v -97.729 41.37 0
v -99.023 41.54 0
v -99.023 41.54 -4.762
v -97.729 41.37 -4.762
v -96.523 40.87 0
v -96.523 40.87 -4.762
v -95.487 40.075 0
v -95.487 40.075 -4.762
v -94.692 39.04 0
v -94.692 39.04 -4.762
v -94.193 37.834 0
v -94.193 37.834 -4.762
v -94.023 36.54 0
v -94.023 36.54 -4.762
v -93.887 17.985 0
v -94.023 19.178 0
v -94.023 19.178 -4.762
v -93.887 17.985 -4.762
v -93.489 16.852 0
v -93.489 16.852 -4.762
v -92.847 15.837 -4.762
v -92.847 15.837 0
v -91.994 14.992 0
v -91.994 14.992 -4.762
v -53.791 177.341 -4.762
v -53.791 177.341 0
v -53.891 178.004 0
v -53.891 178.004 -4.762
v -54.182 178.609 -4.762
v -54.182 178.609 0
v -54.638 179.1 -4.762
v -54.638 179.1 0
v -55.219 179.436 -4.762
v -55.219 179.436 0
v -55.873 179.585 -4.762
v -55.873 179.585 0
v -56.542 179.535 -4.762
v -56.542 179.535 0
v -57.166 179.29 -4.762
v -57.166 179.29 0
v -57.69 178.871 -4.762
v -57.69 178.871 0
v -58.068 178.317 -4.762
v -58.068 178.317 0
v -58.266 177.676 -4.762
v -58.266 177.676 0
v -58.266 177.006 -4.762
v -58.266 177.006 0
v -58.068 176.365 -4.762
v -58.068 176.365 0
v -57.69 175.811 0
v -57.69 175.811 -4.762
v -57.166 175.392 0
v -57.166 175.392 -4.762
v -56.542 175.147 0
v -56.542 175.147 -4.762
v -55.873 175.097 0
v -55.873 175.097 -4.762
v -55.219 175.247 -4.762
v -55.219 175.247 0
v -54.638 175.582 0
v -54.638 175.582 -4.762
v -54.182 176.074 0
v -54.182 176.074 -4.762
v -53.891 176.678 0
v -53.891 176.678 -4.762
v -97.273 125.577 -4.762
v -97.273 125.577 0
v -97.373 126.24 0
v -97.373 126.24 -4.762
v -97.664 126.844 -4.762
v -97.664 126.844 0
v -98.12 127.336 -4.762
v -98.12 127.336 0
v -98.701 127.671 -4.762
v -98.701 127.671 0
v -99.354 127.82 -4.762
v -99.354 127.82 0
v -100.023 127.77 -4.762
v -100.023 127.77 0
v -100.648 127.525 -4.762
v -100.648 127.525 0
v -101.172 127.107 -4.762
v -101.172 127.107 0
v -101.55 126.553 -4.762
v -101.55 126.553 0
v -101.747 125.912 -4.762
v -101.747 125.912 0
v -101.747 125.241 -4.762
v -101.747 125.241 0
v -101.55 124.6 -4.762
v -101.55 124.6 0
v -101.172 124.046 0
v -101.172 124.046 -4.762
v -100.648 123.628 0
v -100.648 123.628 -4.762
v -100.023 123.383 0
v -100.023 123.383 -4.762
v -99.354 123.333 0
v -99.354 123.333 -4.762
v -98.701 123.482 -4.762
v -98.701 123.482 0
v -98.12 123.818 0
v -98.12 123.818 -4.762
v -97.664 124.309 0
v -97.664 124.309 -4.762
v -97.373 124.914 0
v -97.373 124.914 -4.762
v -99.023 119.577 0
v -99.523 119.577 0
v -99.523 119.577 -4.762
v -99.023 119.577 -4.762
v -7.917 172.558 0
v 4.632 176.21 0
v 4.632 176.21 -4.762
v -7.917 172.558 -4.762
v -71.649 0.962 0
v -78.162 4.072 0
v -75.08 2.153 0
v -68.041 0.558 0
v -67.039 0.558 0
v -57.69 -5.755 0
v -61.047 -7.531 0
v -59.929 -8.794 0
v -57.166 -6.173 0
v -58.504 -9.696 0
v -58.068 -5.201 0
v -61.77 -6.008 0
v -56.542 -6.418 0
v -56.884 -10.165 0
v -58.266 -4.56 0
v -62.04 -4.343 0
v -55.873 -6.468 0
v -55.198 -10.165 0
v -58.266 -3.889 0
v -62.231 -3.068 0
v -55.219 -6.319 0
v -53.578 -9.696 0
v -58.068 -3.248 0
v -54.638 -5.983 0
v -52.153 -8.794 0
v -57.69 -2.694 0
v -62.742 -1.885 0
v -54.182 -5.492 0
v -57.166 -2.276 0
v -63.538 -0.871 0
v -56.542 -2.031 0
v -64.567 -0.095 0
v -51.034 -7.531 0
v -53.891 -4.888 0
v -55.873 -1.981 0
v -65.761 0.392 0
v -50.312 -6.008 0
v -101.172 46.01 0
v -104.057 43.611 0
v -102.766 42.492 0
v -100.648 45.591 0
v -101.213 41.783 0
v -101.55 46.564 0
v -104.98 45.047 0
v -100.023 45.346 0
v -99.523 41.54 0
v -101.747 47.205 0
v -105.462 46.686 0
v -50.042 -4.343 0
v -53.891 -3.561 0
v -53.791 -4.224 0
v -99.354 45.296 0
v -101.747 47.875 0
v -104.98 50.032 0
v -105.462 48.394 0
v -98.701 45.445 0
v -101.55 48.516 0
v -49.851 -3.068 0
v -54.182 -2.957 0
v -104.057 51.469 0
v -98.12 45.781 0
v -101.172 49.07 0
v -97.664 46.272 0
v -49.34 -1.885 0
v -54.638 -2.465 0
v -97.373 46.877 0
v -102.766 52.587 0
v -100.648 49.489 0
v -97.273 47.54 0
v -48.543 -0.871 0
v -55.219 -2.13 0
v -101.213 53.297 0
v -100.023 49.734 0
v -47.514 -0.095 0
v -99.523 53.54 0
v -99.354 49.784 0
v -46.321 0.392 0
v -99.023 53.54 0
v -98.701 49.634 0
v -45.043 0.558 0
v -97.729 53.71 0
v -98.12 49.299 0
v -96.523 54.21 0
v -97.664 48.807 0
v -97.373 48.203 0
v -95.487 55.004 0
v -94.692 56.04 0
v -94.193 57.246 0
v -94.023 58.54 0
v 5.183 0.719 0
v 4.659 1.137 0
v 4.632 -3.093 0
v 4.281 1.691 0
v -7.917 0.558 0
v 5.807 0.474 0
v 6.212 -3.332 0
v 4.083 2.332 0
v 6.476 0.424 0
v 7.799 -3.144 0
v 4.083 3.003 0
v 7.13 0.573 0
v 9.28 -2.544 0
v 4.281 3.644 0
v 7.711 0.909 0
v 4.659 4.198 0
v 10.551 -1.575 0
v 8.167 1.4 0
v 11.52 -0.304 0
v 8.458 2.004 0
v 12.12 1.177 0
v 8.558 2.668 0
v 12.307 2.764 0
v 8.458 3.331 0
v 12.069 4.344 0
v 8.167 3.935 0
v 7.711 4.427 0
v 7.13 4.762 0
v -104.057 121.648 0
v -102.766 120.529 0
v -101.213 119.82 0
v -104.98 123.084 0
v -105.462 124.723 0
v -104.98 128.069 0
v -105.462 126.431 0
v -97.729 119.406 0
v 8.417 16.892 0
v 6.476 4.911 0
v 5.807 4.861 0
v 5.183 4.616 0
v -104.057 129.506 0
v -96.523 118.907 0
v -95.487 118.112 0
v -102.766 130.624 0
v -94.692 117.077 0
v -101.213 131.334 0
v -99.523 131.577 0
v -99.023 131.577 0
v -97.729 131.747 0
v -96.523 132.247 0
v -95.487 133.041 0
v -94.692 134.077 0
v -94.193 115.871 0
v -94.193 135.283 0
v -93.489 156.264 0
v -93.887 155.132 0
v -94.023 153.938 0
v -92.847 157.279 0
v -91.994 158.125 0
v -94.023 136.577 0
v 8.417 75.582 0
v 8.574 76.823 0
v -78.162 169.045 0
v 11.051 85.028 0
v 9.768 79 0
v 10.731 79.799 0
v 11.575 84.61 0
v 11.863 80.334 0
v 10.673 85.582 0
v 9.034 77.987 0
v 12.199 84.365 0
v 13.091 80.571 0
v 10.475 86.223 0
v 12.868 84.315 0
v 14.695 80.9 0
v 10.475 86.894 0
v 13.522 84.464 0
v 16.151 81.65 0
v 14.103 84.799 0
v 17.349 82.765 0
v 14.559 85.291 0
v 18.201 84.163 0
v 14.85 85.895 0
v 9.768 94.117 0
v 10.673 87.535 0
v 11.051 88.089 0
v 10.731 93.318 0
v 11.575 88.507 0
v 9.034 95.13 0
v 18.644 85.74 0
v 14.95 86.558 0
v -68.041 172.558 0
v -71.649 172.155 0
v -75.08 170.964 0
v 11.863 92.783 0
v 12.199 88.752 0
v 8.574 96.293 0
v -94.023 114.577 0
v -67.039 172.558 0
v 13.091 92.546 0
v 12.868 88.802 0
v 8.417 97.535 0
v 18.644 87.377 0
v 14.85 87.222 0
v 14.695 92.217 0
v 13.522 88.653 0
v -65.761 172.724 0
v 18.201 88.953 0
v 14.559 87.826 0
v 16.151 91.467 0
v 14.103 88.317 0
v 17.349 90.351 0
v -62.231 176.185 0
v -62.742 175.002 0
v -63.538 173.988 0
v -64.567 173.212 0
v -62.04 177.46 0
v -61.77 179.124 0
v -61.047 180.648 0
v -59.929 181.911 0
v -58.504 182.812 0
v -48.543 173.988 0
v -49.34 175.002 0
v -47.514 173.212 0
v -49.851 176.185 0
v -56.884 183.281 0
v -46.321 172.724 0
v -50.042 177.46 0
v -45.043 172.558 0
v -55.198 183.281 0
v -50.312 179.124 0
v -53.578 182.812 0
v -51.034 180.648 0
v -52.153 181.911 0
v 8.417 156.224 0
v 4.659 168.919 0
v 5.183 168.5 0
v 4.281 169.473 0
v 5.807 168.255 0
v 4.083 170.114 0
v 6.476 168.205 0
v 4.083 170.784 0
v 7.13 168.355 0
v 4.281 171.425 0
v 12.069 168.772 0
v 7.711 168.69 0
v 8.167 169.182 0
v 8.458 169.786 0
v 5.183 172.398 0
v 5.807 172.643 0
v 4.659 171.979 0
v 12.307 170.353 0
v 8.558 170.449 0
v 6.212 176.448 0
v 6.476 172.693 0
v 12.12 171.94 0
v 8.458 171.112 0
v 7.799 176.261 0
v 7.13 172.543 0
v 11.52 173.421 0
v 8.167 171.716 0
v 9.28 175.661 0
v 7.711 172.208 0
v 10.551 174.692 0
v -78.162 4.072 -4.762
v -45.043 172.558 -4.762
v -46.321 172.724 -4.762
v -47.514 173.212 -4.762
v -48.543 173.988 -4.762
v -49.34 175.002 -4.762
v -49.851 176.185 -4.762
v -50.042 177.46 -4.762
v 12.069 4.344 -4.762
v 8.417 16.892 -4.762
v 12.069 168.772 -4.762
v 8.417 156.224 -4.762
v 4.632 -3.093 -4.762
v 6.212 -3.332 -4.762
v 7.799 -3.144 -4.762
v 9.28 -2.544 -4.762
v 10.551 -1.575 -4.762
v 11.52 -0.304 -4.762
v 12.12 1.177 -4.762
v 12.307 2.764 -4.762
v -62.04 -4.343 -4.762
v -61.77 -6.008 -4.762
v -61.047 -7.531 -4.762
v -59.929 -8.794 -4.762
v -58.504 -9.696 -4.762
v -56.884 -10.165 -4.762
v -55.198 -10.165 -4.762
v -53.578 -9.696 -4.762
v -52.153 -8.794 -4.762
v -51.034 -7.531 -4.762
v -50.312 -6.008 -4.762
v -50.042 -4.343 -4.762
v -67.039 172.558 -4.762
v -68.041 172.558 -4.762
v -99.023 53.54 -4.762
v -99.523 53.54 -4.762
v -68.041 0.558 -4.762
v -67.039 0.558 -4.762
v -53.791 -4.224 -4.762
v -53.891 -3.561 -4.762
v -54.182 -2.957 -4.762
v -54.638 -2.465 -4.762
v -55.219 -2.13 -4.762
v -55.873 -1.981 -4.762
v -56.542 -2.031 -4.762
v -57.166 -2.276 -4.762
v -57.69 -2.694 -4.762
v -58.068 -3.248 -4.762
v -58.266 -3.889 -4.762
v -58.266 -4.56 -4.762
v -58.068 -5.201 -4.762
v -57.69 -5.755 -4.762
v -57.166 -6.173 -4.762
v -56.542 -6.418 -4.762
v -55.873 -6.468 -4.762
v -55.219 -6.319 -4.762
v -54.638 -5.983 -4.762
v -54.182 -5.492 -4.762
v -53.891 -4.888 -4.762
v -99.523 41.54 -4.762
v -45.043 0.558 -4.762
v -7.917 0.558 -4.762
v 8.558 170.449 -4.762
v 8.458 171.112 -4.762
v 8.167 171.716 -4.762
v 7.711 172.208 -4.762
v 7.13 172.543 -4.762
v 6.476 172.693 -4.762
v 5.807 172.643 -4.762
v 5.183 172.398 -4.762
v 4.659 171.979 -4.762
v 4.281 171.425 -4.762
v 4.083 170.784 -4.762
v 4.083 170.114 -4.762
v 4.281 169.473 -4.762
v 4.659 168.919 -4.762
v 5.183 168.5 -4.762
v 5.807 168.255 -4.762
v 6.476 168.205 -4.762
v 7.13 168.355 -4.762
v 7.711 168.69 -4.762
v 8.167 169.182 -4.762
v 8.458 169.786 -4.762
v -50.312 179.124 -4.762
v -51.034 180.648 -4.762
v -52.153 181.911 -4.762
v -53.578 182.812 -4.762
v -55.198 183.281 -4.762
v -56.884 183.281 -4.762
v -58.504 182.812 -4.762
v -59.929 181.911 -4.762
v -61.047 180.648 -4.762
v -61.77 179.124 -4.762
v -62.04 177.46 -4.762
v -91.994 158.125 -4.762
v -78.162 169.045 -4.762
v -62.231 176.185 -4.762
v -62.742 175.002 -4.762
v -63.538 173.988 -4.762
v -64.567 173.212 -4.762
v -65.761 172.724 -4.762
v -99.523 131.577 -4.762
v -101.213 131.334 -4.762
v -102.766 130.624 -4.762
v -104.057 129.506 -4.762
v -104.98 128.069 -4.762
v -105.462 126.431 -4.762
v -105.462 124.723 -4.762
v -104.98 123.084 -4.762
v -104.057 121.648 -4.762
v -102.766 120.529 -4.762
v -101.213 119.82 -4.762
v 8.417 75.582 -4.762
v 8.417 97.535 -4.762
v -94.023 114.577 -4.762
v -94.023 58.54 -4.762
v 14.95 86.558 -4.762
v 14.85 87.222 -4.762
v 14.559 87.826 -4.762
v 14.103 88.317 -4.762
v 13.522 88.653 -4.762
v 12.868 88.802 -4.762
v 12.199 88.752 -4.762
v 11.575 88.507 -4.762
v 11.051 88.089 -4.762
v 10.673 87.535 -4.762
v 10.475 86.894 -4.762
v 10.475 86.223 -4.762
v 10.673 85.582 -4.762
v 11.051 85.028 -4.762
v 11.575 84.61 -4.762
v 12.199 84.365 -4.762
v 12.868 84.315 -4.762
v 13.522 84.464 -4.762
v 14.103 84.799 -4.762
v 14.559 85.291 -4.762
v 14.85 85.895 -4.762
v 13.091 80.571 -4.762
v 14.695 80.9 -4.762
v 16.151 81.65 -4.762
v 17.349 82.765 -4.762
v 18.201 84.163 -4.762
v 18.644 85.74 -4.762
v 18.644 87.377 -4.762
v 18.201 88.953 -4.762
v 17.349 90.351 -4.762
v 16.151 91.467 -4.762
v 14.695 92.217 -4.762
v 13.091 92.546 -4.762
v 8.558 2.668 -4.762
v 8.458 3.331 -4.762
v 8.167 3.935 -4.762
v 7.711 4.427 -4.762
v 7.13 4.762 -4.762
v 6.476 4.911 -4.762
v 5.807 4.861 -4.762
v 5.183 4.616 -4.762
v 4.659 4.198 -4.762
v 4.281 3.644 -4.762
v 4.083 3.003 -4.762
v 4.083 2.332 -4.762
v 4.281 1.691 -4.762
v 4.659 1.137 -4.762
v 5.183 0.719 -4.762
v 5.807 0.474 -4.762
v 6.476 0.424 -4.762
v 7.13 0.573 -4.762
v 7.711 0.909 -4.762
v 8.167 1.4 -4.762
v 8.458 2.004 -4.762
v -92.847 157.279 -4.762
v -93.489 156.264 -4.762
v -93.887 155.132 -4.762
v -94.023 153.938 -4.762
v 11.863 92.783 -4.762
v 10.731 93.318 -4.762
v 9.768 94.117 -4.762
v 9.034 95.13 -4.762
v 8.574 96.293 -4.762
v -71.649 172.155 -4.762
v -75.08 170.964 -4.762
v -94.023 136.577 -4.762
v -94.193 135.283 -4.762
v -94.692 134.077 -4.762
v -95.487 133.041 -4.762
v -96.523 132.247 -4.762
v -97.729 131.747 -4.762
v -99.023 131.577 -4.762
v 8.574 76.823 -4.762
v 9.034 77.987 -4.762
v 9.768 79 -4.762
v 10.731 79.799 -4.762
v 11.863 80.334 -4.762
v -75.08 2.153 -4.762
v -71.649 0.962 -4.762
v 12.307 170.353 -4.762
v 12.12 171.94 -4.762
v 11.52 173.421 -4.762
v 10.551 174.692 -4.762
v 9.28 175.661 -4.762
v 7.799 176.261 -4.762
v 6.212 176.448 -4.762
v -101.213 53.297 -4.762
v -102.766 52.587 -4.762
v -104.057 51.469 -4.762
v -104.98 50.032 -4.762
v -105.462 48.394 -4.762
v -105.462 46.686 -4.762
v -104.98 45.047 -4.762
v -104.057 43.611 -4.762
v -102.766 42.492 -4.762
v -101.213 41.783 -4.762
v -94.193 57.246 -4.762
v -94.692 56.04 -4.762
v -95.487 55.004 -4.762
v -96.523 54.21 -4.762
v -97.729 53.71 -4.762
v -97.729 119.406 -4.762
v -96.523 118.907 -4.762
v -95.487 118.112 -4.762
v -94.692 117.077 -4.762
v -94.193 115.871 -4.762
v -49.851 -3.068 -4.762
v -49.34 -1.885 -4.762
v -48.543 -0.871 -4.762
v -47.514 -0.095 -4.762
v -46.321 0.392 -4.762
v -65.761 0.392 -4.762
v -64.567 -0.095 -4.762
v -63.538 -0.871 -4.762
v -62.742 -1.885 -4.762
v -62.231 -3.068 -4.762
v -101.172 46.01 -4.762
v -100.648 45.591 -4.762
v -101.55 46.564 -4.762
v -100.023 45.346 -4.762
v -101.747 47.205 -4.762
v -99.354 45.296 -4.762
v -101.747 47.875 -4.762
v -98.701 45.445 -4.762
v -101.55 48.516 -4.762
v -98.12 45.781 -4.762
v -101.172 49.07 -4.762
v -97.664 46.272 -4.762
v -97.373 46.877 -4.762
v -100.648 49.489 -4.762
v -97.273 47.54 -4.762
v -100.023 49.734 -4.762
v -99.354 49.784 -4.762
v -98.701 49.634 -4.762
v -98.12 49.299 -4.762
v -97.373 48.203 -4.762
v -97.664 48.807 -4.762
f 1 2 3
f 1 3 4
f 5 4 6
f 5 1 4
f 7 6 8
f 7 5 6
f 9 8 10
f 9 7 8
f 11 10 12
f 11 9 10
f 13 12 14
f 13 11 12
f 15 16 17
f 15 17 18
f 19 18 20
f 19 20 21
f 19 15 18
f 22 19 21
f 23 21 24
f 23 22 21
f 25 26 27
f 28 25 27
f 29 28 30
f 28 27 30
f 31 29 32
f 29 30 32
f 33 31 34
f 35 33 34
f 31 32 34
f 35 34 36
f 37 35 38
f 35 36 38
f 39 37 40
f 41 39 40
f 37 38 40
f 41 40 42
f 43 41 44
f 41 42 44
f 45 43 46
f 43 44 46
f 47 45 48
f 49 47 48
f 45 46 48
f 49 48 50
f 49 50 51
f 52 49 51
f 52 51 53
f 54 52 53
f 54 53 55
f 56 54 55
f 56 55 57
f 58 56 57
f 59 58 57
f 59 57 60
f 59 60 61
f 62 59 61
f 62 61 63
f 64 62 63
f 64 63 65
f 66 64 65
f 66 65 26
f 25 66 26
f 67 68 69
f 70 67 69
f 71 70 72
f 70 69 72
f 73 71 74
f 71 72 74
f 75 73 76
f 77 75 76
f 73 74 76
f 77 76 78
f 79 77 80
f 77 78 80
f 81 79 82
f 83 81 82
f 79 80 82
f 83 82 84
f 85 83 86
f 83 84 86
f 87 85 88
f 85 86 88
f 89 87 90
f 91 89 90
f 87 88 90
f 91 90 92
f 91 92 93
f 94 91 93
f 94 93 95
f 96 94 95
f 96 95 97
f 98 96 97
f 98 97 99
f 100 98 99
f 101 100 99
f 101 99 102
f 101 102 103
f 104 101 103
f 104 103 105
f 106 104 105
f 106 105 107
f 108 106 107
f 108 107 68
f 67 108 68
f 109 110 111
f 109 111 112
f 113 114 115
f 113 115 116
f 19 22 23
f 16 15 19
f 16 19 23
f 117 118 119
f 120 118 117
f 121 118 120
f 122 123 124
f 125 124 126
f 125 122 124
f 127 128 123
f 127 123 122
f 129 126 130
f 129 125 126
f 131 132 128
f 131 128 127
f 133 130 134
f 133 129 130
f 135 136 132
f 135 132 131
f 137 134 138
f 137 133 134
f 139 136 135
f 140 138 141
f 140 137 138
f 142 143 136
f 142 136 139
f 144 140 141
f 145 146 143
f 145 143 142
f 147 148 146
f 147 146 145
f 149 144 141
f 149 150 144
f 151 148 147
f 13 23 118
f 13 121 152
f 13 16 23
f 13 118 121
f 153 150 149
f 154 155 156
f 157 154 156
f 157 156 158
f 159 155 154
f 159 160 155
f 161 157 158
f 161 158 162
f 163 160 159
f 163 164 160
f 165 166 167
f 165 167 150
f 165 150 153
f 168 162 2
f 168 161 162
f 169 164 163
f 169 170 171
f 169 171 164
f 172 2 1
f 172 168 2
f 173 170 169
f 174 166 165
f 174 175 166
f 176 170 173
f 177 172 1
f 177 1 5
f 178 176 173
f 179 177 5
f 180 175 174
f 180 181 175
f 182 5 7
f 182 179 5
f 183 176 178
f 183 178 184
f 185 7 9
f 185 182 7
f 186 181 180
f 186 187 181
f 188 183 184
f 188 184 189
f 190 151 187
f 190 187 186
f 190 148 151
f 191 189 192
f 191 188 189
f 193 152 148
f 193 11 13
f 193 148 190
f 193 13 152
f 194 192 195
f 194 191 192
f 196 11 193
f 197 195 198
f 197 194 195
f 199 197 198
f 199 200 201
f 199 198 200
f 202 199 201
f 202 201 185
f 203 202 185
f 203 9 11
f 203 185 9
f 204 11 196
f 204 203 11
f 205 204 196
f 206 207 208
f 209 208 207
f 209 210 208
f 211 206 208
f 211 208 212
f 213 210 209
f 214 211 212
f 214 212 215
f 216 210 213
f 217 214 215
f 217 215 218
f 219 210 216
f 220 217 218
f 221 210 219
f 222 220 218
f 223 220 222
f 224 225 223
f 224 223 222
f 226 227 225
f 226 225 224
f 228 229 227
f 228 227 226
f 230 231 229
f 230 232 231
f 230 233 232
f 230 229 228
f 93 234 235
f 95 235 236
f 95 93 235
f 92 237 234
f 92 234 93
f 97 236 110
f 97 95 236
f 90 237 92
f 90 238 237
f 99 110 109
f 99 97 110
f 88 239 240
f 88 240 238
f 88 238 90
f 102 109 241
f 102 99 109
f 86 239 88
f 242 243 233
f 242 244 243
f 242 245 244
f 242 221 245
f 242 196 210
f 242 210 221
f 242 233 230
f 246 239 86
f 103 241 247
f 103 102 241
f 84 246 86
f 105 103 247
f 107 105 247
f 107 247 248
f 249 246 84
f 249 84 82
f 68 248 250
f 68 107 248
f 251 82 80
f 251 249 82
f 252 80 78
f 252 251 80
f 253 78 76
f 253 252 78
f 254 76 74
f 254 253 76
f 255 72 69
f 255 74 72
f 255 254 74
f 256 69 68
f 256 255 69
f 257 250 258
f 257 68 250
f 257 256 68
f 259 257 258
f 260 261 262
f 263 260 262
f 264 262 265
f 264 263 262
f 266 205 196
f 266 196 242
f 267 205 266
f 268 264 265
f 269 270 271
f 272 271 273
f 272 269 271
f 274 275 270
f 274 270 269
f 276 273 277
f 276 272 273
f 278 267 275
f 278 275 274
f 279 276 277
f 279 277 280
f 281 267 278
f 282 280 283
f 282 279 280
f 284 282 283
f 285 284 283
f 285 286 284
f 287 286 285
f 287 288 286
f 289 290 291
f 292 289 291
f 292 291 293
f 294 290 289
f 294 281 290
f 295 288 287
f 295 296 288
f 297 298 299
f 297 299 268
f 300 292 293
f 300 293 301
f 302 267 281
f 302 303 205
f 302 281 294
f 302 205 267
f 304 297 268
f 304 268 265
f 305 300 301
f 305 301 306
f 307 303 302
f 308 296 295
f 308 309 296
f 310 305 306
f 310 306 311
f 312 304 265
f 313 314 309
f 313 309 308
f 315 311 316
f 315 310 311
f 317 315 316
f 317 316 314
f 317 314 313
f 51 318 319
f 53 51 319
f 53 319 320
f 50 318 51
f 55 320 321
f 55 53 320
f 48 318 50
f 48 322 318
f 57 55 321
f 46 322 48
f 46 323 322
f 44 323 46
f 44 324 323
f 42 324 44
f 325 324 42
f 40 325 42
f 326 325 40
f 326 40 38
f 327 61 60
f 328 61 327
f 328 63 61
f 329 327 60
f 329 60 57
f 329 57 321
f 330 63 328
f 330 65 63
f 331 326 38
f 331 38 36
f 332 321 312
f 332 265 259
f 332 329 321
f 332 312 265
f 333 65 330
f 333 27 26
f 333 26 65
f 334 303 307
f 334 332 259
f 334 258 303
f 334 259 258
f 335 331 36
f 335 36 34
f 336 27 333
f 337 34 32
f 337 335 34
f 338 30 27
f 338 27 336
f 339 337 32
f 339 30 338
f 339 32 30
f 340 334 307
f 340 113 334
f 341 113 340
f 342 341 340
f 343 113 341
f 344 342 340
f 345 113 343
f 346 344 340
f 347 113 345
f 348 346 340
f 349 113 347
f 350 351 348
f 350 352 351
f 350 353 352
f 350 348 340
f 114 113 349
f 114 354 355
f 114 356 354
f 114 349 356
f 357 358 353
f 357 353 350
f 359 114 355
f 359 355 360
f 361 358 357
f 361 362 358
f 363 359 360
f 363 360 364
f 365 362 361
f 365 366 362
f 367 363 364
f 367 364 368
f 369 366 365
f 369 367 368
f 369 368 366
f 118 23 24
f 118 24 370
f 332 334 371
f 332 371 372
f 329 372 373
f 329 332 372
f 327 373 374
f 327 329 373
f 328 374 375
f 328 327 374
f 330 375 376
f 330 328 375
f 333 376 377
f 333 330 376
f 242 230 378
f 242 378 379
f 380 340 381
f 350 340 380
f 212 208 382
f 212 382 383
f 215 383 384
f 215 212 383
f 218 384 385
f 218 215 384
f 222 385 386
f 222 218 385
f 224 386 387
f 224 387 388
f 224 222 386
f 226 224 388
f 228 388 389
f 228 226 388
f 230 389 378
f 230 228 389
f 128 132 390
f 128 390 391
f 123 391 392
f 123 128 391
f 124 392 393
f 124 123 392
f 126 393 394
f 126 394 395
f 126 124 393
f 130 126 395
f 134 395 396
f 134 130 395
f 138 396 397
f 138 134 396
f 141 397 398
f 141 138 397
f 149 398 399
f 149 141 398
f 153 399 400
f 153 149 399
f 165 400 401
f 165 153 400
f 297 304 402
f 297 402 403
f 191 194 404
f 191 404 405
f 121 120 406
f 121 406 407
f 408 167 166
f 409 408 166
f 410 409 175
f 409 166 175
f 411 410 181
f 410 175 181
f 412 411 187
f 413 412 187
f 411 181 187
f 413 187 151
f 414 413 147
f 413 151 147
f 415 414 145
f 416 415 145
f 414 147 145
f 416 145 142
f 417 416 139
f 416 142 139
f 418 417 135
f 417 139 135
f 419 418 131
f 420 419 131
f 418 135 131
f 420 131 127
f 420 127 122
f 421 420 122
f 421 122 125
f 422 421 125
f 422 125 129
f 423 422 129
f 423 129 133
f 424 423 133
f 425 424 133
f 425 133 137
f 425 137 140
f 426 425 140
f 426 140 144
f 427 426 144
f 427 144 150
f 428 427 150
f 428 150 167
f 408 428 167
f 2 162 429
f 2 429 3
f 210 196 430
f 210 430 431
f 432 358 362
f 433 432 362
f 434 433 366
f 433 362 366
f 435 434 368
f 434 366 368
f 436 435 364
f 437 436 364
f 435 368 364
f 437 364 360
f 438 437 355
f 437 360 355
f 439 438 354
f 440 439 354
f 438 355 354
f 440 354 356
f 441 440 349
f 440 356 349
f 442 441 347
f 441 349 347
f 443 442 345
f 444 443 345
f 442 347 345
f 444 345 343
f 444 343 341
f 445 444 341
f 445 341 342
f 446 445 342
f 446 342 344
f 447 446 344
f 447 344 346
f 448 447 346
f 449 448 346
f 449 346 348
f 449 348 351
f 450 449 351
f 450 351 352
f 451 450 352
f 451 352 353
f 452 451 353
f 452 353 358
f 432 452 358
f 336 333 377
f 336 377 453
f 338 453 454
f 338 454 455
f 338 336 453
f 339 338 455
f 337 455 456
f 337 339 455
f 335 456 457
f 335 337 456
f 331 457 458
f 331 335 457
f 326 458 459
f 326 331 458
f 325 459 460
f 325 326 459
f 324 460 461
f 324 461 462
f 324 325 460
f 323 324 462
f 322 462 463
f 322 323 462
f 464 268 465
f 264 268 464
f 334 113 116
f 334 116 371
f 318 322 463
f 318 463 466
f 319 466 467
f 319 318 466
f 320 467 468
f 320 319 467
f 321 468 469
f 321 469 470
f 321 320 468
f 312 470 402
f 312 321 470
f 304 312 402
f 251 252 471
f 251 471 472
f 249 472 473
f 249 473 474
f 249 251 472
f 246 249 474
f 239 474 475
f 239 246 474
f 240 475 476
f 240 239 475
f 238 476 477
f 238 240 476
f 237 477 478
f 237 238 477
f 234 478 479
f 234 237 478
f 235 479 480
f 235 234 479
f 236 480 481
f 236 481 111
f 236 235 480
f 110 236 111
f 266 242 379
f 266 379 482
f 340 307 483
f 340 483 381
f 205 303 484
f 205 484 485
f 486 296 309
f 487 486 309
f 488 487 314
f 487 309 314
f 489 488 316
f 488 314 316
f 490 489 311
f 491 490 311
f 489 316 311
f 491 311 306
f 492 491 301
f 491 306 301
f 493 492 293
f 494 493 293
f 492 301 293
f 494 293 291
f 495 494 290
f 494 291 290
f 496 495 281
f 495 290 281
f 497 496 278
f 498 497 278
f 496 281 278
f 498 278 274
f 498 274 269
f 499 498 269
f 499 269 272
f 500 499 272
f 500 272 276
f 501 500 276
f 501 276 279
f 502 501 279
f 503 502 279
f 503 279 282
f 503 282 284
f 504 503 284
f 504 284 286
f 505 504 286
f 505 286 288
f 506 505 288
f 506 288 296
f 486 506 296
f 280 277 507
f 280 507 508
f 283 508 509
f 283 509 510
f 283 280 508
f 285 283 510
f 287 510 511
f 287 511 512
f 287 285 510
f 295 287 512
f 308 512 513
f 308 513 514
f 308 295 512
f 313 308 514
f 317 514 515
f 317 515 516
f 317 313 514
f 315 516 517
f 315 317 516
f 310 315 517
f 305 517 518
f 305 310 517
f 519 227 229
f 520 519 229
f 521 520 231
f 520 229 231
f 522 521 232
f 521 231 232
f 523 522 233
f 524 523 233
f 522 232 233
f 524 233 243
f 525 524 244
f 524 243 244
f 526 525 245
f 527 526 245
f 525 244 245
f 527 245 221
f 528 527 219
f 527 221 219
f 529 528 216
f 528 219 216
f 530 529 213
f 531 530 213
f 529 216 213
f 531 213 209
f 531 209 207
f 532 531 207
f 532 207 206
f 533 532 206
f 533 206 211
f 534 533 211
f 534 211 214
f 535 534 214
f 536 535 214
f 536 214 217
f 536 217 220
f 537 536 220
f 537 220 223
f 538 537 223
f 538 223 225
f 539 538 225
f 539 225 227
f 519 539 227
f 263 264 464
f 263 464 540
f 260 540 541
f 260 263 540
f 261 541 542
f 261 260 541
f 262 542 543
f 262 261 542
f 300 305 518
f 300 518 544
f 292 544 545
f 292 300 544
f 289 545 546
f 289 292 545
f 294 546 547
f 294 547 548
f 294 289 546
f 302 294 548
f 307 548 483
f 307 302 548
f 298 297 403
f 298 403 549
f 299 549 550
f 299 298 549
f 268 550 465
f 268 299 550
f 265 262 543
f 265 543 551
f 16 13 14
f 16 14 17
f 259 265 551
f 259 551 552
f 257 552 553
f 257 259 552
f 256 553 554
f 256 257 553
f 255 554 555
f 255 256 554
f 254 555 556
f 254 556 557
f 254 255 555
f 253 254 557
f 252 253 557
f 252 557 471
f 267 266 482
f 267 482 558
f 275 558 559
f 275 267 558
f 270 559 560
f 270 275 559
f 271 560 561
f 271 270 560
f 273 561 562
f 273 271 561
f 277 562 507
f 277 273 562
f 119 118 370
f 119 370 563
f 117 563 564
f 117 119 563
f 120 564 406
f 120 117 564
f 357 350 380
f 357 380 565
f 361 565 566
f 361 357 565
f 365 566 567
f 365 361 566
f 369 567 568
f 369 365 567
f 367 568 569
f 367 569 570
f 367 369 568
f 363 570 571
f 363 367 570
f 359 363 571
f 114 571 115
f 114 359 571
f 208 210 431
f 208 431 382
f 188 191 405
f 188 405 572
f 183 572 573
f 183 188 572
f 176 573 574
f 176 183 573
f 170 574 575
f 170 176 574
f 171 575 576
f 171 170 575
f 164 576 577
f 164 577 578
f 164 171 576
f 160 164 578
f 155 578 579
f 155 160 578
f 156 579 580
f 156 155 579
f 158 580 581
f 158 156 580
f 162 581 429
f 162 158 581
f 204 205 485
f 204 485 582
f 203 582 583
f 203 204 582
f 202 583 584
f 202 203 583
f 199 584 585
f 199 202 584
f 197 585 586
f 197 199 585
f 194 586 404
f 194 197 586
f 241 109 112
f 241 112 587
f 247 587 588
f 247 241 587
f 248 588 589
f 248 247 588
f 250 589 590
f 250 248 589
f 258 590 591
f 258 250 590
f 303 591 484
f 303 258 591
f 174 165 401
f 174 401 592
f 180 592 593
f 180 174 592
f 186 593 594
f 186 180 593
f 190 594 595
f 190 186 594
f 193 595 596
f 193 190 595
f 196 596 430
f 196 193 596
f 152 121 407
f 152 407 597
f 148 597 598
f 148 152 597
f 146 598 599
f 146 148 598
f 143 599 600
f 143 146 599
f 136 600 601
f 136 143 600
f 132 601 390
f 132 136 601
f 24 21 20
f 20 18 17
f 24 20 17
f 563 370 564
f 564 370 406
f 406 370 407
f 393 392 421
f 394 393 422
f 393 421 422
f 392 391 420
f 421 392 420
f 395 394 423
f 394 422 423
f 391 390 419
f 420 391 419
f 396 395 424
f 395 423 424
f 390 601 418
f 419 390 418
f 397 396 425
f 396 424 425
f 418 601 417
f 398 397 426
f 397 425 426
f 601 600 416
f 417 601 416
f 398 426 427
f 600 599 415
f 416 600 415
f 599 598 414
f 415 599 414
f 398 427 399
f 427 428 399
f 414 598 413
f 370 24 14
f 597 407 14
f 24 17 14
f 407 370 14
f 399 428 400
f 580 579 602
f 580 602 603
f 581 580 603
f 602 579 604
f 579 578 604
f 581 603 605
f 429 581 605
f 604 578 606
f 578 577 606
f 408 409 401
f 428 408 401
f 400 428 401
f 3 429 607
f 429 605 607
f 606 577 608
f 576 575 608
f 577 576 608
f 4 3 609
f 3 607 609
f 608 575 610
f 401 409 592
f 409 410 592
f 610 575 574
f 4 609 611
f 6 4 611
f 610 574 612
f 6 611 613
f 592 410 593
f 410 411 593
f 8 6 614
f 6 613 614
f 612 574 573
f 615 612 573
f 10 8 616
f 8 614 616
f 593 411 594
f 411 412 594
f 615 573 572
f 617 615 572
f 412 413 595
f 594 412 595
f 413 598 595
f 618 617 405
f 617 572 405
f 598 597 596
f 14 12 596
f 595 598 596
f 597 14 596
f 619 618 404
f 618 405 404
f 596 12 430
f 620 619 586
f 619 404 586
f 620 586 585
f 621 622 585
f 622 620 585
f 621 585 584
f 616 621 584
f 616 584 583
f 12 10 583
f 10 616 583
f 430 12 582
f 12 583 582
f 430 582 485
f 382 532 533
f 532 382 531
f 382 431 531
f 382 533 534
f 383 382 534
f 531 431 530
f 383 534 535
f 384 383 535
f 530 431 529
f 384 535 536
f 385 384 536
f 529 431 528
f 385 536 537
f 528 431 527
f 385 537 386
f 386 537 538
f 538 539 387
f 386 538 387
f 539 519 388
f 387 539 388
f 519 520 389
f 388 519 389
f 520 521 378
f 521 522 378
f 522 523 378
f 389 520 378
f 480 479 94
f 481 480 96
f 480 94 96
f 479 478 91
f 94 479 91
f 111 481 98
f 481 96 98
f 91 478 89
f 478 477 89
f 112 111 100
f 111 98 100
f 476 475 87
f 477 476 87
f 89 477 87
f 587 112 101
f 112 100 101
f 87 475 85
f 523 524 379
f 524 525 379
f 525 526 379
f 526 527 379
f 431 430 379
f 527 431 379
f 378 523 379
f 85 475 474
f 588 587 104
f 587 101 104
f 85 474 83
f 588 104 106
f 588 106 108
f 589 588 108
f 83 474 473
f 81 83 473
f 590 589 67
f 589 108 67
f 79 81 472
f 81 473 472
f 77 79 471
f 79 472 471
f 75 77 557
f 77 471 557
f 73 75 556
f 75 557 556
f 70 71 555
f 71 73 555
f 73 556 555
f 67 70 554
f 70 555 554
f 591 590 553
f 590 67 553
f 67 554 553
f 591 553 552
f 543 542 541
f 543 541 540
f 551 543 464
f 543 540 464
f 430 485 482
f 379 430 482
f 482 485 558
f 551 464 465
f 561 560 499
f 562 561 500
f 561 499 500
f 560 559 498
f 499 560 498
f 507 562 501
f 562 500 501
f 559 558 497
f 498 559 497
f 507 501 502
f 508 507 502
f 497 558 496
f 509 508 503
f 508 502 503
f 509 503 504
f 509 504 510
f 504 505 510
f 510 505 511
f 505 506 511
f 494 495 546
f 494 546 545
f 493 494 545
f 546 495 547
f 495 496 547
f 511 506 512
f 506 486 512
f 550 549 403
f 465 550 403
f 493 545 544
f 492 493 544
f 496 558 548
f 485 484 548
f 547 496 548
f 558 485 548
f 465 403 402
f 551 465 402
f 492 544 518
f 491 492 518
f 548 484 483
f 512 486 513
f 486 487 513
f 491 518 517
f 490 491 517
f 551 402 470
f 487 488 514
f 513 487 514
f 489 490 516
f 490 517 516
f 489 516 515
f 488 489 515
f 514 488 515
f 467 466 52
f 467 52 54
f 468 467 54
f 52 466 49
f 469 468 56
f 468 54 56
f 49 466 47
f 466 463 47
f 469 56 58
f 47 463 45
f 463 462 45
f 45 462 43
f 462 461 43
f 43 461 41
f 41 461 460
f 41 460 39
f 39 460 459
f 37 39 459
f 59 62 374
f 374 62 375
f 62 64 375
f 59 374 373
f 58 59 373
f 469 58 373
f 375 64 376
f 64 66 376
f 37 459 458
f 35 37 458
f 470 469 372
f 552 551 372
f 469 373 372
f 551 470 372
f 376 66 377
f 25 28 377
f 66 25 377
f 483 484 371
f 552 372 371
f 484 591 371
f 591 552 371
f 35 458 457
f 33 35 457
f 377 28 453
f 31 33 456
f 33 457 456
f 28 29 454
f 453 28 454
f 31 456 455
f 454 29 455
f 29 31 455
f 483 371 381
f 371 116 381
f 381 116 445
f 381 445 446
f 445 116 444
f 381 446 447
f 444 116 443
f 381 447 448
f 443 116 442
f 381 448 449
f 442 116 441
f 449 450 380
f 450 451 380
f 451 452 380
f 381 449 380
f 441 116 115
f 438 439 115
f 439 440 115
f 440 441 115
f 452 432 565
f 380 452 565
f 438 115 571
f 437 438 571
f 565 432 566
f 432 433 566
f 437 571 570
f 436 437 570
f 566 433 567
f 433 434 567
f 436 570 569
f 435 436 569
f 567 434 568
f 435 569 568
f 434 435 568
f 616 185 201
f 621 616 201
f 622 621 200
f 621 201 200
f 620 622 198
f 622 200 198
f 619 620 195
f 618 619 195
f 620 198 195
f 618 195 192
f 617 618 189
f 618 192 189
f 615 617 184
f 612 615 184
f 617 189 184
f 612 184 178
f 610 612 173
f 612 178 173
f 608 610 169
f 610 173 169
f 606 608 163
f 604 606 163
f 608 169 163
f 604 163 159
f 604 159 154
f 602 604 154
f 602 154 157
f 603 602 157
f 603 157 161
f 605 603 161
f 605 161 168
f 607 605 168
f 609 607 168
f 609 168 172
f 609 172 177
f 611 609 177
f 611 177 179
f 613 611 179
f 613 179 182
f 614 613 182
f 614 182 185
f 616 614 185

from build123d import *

# Parameters (mm, degrees)
BOSS_EXTRUDE1_DEPTH  = 4.7625
M4_CLEARANCE_HOLE1_D = 4.5


with BuildPart() as part:
    # Sketch1 → Boss-Extrude1 (new body)
    with BuildSketch(Plane.XY):
        with BuildLine():
            Line((-94.022602581, 36.539962058), (-94.022602581, 19.178370731))
            ThreePointArc((-94.022602581, 19.178370731), (-93.488675507, 16.852246076), (-91.993785217, 14.99180606))
            Line((-91.993785217, 14.99180606), (-78.162107839, 4.072060761))
            ThreePointArc((-78.162107839, 4.072060761), (-73.397757976, 1.461750489), (-68.040838029, 0.558335853))
            Line((-68.040838029, 0.558335853), (-67.038691488, 0.558335853))
            ThreePointArc((-67.038691488, 0.558335853), (-63.538253204, -0.87137959), (-62.039667189, -4.342891419))
            ThreePointArc((-62.039667189, -4.342891419), (-56.040838029, -10.224364147), (-50.04200887, -4.342891419))
            ThreePointArc((-50.04200887, -4.342891419), (-48.543422854, -0.87137959), (-45.04298457, 0.558335853))
            Line((-45.04298457, 0.558335853), (-7.916602581, 0.558335853))
            Line((-7.916602581, 0.558335853), (4.631523913, -3.09333052))
            ThreePointArc((4.631523913, -3.09333052), (10.550693091, -1.574959819), (12.069063792, 4.344209359))
            Line((12.069063792, 4.344209359), (8.417397419, 16.892335853))
            Line((8.417397419, 16.892335853), (8.417397419, 75.581748009))
            ThreePointArc((8.417397419, 75.581748009), (9.768409389, 79.000064314), (13.091351964, 80.57110612))
            ThreePointArc((13.091351964, 80.57110612), (18.700097419, 86.558335853), (13.091351964, 92.545565587))
            ThreePointArc((13.091351964, 92.545565587), (9.768409389, 94.116607393), (8.417397419, 97.534923698))
            Line((8.417397419, 97.534923698), (8.417397419, 156.224335853))
            Line((8.417397419, 156.224335853), (12.069063792, 168.772462348))
            ThreePointArc((12.069063792, 168.772462348), (10.550693091, 174.691631526), (4.631523913, 176.210002227))
            Line((4.631523913, 176.210002227), (-7.916602581, 172.558335853))
            Line((-7.916602581, 172.558335853), (-45.04298457, 172.558335853))
            ThreePointArc((-45.04298457, 172.558335853), (-48.543422854, 173.988051296), (-50.04200887, 177.459563126))
            ThreePointArc((-50.04200887, 177.459563126), (-56.040838029, 183.341035853), (-62.039667189, 177.459563126))
            ThreePointArc((-62.039667189, 177.459563126), (-63.538253204, 173.988051296), (-67.038691488, 172.558335853))
            Line((-67.038691488, 172.558335853), (-68.040838029, 172.558335853))
            ThreePointArc((-68.040838029, 172.558335853), (-73.397757976, 171.654921218), (-78.162107839, 169.044610946))
            Line((-78.162107839, 169.044610946), (-91.993785217, 158.124865647))
            ThreePointArc((-91.993785217, 158.124865647), (-93.488675507, 156.264425631), (-94.022602581, 153.938300976))
            Line((-94.022602581, 153.938300976), (-94.022602581, 136.576709649))
            ThreePointArc((-94.022602581, 136.576709649), (-95.487068676, 133.041175743), (-99.022602581, 131.576709649))
            Line((-99.022602581, 131.576709649), (-99.522602581, 131.576709649))
            ThreePointArc((-99.522602581, 131.576709649), (-105.522602581, 125.576709649), (-99.522602581, 119.576709649))
            Line((-99.522602581, 119.576709649), (-99.022602581, 119.576709649))
            ThreePointArc((-99.022602581, 119.576709649), (-95.487068676, 118.112243554), (-94.022602581, 114.576709649))
            Line((-94.022602581, 114.576709649), (-94.022602581, 58.539962058))
            ThreePointArc((-94.022602581, 58.539962058), (-95.487068676, 55.004428152), (-99.022602581, 53.539962058))
            Line((-99.022602581, 53.539962058), (-99.522602581, 53.539962058))
            ThreePointArc((-99.522602581, 53.539962058), (-105.522602581, 47.539962058), (-99.522602581, 41.539962058))
            Line((-99.522602581, 41.539962058), (-99.022602581, 41.539962058))
            ThreePointArc((-99.022602581, 41.539962058), (-95.487068676, 40.075495964), (-94.022602581, 36.539962058))
        make_face()
    extrude(amount=-BOSS_EXTRUDE1_DEPTH)

    # M4 Clearance Hole1 (through all)
    with Locations(Plane(origin=(0, 0, -4.7625), x_dir=(-1, 0, 0), z_dir=(0, 0, -1))):
        with Locations((-12.700097419, 86.558335853), (-6.308052404, 2.667680868), (-6.308052404, 170.448990839), (99.522602581, 47.539962058), (99.522602581, 125.576709649), (56.040838029, 177.341035853), (56.040838029, -4.224364147)):
            Hole(M4_CLEARANCE_HOLE1_D / 2)


solid = part.part
